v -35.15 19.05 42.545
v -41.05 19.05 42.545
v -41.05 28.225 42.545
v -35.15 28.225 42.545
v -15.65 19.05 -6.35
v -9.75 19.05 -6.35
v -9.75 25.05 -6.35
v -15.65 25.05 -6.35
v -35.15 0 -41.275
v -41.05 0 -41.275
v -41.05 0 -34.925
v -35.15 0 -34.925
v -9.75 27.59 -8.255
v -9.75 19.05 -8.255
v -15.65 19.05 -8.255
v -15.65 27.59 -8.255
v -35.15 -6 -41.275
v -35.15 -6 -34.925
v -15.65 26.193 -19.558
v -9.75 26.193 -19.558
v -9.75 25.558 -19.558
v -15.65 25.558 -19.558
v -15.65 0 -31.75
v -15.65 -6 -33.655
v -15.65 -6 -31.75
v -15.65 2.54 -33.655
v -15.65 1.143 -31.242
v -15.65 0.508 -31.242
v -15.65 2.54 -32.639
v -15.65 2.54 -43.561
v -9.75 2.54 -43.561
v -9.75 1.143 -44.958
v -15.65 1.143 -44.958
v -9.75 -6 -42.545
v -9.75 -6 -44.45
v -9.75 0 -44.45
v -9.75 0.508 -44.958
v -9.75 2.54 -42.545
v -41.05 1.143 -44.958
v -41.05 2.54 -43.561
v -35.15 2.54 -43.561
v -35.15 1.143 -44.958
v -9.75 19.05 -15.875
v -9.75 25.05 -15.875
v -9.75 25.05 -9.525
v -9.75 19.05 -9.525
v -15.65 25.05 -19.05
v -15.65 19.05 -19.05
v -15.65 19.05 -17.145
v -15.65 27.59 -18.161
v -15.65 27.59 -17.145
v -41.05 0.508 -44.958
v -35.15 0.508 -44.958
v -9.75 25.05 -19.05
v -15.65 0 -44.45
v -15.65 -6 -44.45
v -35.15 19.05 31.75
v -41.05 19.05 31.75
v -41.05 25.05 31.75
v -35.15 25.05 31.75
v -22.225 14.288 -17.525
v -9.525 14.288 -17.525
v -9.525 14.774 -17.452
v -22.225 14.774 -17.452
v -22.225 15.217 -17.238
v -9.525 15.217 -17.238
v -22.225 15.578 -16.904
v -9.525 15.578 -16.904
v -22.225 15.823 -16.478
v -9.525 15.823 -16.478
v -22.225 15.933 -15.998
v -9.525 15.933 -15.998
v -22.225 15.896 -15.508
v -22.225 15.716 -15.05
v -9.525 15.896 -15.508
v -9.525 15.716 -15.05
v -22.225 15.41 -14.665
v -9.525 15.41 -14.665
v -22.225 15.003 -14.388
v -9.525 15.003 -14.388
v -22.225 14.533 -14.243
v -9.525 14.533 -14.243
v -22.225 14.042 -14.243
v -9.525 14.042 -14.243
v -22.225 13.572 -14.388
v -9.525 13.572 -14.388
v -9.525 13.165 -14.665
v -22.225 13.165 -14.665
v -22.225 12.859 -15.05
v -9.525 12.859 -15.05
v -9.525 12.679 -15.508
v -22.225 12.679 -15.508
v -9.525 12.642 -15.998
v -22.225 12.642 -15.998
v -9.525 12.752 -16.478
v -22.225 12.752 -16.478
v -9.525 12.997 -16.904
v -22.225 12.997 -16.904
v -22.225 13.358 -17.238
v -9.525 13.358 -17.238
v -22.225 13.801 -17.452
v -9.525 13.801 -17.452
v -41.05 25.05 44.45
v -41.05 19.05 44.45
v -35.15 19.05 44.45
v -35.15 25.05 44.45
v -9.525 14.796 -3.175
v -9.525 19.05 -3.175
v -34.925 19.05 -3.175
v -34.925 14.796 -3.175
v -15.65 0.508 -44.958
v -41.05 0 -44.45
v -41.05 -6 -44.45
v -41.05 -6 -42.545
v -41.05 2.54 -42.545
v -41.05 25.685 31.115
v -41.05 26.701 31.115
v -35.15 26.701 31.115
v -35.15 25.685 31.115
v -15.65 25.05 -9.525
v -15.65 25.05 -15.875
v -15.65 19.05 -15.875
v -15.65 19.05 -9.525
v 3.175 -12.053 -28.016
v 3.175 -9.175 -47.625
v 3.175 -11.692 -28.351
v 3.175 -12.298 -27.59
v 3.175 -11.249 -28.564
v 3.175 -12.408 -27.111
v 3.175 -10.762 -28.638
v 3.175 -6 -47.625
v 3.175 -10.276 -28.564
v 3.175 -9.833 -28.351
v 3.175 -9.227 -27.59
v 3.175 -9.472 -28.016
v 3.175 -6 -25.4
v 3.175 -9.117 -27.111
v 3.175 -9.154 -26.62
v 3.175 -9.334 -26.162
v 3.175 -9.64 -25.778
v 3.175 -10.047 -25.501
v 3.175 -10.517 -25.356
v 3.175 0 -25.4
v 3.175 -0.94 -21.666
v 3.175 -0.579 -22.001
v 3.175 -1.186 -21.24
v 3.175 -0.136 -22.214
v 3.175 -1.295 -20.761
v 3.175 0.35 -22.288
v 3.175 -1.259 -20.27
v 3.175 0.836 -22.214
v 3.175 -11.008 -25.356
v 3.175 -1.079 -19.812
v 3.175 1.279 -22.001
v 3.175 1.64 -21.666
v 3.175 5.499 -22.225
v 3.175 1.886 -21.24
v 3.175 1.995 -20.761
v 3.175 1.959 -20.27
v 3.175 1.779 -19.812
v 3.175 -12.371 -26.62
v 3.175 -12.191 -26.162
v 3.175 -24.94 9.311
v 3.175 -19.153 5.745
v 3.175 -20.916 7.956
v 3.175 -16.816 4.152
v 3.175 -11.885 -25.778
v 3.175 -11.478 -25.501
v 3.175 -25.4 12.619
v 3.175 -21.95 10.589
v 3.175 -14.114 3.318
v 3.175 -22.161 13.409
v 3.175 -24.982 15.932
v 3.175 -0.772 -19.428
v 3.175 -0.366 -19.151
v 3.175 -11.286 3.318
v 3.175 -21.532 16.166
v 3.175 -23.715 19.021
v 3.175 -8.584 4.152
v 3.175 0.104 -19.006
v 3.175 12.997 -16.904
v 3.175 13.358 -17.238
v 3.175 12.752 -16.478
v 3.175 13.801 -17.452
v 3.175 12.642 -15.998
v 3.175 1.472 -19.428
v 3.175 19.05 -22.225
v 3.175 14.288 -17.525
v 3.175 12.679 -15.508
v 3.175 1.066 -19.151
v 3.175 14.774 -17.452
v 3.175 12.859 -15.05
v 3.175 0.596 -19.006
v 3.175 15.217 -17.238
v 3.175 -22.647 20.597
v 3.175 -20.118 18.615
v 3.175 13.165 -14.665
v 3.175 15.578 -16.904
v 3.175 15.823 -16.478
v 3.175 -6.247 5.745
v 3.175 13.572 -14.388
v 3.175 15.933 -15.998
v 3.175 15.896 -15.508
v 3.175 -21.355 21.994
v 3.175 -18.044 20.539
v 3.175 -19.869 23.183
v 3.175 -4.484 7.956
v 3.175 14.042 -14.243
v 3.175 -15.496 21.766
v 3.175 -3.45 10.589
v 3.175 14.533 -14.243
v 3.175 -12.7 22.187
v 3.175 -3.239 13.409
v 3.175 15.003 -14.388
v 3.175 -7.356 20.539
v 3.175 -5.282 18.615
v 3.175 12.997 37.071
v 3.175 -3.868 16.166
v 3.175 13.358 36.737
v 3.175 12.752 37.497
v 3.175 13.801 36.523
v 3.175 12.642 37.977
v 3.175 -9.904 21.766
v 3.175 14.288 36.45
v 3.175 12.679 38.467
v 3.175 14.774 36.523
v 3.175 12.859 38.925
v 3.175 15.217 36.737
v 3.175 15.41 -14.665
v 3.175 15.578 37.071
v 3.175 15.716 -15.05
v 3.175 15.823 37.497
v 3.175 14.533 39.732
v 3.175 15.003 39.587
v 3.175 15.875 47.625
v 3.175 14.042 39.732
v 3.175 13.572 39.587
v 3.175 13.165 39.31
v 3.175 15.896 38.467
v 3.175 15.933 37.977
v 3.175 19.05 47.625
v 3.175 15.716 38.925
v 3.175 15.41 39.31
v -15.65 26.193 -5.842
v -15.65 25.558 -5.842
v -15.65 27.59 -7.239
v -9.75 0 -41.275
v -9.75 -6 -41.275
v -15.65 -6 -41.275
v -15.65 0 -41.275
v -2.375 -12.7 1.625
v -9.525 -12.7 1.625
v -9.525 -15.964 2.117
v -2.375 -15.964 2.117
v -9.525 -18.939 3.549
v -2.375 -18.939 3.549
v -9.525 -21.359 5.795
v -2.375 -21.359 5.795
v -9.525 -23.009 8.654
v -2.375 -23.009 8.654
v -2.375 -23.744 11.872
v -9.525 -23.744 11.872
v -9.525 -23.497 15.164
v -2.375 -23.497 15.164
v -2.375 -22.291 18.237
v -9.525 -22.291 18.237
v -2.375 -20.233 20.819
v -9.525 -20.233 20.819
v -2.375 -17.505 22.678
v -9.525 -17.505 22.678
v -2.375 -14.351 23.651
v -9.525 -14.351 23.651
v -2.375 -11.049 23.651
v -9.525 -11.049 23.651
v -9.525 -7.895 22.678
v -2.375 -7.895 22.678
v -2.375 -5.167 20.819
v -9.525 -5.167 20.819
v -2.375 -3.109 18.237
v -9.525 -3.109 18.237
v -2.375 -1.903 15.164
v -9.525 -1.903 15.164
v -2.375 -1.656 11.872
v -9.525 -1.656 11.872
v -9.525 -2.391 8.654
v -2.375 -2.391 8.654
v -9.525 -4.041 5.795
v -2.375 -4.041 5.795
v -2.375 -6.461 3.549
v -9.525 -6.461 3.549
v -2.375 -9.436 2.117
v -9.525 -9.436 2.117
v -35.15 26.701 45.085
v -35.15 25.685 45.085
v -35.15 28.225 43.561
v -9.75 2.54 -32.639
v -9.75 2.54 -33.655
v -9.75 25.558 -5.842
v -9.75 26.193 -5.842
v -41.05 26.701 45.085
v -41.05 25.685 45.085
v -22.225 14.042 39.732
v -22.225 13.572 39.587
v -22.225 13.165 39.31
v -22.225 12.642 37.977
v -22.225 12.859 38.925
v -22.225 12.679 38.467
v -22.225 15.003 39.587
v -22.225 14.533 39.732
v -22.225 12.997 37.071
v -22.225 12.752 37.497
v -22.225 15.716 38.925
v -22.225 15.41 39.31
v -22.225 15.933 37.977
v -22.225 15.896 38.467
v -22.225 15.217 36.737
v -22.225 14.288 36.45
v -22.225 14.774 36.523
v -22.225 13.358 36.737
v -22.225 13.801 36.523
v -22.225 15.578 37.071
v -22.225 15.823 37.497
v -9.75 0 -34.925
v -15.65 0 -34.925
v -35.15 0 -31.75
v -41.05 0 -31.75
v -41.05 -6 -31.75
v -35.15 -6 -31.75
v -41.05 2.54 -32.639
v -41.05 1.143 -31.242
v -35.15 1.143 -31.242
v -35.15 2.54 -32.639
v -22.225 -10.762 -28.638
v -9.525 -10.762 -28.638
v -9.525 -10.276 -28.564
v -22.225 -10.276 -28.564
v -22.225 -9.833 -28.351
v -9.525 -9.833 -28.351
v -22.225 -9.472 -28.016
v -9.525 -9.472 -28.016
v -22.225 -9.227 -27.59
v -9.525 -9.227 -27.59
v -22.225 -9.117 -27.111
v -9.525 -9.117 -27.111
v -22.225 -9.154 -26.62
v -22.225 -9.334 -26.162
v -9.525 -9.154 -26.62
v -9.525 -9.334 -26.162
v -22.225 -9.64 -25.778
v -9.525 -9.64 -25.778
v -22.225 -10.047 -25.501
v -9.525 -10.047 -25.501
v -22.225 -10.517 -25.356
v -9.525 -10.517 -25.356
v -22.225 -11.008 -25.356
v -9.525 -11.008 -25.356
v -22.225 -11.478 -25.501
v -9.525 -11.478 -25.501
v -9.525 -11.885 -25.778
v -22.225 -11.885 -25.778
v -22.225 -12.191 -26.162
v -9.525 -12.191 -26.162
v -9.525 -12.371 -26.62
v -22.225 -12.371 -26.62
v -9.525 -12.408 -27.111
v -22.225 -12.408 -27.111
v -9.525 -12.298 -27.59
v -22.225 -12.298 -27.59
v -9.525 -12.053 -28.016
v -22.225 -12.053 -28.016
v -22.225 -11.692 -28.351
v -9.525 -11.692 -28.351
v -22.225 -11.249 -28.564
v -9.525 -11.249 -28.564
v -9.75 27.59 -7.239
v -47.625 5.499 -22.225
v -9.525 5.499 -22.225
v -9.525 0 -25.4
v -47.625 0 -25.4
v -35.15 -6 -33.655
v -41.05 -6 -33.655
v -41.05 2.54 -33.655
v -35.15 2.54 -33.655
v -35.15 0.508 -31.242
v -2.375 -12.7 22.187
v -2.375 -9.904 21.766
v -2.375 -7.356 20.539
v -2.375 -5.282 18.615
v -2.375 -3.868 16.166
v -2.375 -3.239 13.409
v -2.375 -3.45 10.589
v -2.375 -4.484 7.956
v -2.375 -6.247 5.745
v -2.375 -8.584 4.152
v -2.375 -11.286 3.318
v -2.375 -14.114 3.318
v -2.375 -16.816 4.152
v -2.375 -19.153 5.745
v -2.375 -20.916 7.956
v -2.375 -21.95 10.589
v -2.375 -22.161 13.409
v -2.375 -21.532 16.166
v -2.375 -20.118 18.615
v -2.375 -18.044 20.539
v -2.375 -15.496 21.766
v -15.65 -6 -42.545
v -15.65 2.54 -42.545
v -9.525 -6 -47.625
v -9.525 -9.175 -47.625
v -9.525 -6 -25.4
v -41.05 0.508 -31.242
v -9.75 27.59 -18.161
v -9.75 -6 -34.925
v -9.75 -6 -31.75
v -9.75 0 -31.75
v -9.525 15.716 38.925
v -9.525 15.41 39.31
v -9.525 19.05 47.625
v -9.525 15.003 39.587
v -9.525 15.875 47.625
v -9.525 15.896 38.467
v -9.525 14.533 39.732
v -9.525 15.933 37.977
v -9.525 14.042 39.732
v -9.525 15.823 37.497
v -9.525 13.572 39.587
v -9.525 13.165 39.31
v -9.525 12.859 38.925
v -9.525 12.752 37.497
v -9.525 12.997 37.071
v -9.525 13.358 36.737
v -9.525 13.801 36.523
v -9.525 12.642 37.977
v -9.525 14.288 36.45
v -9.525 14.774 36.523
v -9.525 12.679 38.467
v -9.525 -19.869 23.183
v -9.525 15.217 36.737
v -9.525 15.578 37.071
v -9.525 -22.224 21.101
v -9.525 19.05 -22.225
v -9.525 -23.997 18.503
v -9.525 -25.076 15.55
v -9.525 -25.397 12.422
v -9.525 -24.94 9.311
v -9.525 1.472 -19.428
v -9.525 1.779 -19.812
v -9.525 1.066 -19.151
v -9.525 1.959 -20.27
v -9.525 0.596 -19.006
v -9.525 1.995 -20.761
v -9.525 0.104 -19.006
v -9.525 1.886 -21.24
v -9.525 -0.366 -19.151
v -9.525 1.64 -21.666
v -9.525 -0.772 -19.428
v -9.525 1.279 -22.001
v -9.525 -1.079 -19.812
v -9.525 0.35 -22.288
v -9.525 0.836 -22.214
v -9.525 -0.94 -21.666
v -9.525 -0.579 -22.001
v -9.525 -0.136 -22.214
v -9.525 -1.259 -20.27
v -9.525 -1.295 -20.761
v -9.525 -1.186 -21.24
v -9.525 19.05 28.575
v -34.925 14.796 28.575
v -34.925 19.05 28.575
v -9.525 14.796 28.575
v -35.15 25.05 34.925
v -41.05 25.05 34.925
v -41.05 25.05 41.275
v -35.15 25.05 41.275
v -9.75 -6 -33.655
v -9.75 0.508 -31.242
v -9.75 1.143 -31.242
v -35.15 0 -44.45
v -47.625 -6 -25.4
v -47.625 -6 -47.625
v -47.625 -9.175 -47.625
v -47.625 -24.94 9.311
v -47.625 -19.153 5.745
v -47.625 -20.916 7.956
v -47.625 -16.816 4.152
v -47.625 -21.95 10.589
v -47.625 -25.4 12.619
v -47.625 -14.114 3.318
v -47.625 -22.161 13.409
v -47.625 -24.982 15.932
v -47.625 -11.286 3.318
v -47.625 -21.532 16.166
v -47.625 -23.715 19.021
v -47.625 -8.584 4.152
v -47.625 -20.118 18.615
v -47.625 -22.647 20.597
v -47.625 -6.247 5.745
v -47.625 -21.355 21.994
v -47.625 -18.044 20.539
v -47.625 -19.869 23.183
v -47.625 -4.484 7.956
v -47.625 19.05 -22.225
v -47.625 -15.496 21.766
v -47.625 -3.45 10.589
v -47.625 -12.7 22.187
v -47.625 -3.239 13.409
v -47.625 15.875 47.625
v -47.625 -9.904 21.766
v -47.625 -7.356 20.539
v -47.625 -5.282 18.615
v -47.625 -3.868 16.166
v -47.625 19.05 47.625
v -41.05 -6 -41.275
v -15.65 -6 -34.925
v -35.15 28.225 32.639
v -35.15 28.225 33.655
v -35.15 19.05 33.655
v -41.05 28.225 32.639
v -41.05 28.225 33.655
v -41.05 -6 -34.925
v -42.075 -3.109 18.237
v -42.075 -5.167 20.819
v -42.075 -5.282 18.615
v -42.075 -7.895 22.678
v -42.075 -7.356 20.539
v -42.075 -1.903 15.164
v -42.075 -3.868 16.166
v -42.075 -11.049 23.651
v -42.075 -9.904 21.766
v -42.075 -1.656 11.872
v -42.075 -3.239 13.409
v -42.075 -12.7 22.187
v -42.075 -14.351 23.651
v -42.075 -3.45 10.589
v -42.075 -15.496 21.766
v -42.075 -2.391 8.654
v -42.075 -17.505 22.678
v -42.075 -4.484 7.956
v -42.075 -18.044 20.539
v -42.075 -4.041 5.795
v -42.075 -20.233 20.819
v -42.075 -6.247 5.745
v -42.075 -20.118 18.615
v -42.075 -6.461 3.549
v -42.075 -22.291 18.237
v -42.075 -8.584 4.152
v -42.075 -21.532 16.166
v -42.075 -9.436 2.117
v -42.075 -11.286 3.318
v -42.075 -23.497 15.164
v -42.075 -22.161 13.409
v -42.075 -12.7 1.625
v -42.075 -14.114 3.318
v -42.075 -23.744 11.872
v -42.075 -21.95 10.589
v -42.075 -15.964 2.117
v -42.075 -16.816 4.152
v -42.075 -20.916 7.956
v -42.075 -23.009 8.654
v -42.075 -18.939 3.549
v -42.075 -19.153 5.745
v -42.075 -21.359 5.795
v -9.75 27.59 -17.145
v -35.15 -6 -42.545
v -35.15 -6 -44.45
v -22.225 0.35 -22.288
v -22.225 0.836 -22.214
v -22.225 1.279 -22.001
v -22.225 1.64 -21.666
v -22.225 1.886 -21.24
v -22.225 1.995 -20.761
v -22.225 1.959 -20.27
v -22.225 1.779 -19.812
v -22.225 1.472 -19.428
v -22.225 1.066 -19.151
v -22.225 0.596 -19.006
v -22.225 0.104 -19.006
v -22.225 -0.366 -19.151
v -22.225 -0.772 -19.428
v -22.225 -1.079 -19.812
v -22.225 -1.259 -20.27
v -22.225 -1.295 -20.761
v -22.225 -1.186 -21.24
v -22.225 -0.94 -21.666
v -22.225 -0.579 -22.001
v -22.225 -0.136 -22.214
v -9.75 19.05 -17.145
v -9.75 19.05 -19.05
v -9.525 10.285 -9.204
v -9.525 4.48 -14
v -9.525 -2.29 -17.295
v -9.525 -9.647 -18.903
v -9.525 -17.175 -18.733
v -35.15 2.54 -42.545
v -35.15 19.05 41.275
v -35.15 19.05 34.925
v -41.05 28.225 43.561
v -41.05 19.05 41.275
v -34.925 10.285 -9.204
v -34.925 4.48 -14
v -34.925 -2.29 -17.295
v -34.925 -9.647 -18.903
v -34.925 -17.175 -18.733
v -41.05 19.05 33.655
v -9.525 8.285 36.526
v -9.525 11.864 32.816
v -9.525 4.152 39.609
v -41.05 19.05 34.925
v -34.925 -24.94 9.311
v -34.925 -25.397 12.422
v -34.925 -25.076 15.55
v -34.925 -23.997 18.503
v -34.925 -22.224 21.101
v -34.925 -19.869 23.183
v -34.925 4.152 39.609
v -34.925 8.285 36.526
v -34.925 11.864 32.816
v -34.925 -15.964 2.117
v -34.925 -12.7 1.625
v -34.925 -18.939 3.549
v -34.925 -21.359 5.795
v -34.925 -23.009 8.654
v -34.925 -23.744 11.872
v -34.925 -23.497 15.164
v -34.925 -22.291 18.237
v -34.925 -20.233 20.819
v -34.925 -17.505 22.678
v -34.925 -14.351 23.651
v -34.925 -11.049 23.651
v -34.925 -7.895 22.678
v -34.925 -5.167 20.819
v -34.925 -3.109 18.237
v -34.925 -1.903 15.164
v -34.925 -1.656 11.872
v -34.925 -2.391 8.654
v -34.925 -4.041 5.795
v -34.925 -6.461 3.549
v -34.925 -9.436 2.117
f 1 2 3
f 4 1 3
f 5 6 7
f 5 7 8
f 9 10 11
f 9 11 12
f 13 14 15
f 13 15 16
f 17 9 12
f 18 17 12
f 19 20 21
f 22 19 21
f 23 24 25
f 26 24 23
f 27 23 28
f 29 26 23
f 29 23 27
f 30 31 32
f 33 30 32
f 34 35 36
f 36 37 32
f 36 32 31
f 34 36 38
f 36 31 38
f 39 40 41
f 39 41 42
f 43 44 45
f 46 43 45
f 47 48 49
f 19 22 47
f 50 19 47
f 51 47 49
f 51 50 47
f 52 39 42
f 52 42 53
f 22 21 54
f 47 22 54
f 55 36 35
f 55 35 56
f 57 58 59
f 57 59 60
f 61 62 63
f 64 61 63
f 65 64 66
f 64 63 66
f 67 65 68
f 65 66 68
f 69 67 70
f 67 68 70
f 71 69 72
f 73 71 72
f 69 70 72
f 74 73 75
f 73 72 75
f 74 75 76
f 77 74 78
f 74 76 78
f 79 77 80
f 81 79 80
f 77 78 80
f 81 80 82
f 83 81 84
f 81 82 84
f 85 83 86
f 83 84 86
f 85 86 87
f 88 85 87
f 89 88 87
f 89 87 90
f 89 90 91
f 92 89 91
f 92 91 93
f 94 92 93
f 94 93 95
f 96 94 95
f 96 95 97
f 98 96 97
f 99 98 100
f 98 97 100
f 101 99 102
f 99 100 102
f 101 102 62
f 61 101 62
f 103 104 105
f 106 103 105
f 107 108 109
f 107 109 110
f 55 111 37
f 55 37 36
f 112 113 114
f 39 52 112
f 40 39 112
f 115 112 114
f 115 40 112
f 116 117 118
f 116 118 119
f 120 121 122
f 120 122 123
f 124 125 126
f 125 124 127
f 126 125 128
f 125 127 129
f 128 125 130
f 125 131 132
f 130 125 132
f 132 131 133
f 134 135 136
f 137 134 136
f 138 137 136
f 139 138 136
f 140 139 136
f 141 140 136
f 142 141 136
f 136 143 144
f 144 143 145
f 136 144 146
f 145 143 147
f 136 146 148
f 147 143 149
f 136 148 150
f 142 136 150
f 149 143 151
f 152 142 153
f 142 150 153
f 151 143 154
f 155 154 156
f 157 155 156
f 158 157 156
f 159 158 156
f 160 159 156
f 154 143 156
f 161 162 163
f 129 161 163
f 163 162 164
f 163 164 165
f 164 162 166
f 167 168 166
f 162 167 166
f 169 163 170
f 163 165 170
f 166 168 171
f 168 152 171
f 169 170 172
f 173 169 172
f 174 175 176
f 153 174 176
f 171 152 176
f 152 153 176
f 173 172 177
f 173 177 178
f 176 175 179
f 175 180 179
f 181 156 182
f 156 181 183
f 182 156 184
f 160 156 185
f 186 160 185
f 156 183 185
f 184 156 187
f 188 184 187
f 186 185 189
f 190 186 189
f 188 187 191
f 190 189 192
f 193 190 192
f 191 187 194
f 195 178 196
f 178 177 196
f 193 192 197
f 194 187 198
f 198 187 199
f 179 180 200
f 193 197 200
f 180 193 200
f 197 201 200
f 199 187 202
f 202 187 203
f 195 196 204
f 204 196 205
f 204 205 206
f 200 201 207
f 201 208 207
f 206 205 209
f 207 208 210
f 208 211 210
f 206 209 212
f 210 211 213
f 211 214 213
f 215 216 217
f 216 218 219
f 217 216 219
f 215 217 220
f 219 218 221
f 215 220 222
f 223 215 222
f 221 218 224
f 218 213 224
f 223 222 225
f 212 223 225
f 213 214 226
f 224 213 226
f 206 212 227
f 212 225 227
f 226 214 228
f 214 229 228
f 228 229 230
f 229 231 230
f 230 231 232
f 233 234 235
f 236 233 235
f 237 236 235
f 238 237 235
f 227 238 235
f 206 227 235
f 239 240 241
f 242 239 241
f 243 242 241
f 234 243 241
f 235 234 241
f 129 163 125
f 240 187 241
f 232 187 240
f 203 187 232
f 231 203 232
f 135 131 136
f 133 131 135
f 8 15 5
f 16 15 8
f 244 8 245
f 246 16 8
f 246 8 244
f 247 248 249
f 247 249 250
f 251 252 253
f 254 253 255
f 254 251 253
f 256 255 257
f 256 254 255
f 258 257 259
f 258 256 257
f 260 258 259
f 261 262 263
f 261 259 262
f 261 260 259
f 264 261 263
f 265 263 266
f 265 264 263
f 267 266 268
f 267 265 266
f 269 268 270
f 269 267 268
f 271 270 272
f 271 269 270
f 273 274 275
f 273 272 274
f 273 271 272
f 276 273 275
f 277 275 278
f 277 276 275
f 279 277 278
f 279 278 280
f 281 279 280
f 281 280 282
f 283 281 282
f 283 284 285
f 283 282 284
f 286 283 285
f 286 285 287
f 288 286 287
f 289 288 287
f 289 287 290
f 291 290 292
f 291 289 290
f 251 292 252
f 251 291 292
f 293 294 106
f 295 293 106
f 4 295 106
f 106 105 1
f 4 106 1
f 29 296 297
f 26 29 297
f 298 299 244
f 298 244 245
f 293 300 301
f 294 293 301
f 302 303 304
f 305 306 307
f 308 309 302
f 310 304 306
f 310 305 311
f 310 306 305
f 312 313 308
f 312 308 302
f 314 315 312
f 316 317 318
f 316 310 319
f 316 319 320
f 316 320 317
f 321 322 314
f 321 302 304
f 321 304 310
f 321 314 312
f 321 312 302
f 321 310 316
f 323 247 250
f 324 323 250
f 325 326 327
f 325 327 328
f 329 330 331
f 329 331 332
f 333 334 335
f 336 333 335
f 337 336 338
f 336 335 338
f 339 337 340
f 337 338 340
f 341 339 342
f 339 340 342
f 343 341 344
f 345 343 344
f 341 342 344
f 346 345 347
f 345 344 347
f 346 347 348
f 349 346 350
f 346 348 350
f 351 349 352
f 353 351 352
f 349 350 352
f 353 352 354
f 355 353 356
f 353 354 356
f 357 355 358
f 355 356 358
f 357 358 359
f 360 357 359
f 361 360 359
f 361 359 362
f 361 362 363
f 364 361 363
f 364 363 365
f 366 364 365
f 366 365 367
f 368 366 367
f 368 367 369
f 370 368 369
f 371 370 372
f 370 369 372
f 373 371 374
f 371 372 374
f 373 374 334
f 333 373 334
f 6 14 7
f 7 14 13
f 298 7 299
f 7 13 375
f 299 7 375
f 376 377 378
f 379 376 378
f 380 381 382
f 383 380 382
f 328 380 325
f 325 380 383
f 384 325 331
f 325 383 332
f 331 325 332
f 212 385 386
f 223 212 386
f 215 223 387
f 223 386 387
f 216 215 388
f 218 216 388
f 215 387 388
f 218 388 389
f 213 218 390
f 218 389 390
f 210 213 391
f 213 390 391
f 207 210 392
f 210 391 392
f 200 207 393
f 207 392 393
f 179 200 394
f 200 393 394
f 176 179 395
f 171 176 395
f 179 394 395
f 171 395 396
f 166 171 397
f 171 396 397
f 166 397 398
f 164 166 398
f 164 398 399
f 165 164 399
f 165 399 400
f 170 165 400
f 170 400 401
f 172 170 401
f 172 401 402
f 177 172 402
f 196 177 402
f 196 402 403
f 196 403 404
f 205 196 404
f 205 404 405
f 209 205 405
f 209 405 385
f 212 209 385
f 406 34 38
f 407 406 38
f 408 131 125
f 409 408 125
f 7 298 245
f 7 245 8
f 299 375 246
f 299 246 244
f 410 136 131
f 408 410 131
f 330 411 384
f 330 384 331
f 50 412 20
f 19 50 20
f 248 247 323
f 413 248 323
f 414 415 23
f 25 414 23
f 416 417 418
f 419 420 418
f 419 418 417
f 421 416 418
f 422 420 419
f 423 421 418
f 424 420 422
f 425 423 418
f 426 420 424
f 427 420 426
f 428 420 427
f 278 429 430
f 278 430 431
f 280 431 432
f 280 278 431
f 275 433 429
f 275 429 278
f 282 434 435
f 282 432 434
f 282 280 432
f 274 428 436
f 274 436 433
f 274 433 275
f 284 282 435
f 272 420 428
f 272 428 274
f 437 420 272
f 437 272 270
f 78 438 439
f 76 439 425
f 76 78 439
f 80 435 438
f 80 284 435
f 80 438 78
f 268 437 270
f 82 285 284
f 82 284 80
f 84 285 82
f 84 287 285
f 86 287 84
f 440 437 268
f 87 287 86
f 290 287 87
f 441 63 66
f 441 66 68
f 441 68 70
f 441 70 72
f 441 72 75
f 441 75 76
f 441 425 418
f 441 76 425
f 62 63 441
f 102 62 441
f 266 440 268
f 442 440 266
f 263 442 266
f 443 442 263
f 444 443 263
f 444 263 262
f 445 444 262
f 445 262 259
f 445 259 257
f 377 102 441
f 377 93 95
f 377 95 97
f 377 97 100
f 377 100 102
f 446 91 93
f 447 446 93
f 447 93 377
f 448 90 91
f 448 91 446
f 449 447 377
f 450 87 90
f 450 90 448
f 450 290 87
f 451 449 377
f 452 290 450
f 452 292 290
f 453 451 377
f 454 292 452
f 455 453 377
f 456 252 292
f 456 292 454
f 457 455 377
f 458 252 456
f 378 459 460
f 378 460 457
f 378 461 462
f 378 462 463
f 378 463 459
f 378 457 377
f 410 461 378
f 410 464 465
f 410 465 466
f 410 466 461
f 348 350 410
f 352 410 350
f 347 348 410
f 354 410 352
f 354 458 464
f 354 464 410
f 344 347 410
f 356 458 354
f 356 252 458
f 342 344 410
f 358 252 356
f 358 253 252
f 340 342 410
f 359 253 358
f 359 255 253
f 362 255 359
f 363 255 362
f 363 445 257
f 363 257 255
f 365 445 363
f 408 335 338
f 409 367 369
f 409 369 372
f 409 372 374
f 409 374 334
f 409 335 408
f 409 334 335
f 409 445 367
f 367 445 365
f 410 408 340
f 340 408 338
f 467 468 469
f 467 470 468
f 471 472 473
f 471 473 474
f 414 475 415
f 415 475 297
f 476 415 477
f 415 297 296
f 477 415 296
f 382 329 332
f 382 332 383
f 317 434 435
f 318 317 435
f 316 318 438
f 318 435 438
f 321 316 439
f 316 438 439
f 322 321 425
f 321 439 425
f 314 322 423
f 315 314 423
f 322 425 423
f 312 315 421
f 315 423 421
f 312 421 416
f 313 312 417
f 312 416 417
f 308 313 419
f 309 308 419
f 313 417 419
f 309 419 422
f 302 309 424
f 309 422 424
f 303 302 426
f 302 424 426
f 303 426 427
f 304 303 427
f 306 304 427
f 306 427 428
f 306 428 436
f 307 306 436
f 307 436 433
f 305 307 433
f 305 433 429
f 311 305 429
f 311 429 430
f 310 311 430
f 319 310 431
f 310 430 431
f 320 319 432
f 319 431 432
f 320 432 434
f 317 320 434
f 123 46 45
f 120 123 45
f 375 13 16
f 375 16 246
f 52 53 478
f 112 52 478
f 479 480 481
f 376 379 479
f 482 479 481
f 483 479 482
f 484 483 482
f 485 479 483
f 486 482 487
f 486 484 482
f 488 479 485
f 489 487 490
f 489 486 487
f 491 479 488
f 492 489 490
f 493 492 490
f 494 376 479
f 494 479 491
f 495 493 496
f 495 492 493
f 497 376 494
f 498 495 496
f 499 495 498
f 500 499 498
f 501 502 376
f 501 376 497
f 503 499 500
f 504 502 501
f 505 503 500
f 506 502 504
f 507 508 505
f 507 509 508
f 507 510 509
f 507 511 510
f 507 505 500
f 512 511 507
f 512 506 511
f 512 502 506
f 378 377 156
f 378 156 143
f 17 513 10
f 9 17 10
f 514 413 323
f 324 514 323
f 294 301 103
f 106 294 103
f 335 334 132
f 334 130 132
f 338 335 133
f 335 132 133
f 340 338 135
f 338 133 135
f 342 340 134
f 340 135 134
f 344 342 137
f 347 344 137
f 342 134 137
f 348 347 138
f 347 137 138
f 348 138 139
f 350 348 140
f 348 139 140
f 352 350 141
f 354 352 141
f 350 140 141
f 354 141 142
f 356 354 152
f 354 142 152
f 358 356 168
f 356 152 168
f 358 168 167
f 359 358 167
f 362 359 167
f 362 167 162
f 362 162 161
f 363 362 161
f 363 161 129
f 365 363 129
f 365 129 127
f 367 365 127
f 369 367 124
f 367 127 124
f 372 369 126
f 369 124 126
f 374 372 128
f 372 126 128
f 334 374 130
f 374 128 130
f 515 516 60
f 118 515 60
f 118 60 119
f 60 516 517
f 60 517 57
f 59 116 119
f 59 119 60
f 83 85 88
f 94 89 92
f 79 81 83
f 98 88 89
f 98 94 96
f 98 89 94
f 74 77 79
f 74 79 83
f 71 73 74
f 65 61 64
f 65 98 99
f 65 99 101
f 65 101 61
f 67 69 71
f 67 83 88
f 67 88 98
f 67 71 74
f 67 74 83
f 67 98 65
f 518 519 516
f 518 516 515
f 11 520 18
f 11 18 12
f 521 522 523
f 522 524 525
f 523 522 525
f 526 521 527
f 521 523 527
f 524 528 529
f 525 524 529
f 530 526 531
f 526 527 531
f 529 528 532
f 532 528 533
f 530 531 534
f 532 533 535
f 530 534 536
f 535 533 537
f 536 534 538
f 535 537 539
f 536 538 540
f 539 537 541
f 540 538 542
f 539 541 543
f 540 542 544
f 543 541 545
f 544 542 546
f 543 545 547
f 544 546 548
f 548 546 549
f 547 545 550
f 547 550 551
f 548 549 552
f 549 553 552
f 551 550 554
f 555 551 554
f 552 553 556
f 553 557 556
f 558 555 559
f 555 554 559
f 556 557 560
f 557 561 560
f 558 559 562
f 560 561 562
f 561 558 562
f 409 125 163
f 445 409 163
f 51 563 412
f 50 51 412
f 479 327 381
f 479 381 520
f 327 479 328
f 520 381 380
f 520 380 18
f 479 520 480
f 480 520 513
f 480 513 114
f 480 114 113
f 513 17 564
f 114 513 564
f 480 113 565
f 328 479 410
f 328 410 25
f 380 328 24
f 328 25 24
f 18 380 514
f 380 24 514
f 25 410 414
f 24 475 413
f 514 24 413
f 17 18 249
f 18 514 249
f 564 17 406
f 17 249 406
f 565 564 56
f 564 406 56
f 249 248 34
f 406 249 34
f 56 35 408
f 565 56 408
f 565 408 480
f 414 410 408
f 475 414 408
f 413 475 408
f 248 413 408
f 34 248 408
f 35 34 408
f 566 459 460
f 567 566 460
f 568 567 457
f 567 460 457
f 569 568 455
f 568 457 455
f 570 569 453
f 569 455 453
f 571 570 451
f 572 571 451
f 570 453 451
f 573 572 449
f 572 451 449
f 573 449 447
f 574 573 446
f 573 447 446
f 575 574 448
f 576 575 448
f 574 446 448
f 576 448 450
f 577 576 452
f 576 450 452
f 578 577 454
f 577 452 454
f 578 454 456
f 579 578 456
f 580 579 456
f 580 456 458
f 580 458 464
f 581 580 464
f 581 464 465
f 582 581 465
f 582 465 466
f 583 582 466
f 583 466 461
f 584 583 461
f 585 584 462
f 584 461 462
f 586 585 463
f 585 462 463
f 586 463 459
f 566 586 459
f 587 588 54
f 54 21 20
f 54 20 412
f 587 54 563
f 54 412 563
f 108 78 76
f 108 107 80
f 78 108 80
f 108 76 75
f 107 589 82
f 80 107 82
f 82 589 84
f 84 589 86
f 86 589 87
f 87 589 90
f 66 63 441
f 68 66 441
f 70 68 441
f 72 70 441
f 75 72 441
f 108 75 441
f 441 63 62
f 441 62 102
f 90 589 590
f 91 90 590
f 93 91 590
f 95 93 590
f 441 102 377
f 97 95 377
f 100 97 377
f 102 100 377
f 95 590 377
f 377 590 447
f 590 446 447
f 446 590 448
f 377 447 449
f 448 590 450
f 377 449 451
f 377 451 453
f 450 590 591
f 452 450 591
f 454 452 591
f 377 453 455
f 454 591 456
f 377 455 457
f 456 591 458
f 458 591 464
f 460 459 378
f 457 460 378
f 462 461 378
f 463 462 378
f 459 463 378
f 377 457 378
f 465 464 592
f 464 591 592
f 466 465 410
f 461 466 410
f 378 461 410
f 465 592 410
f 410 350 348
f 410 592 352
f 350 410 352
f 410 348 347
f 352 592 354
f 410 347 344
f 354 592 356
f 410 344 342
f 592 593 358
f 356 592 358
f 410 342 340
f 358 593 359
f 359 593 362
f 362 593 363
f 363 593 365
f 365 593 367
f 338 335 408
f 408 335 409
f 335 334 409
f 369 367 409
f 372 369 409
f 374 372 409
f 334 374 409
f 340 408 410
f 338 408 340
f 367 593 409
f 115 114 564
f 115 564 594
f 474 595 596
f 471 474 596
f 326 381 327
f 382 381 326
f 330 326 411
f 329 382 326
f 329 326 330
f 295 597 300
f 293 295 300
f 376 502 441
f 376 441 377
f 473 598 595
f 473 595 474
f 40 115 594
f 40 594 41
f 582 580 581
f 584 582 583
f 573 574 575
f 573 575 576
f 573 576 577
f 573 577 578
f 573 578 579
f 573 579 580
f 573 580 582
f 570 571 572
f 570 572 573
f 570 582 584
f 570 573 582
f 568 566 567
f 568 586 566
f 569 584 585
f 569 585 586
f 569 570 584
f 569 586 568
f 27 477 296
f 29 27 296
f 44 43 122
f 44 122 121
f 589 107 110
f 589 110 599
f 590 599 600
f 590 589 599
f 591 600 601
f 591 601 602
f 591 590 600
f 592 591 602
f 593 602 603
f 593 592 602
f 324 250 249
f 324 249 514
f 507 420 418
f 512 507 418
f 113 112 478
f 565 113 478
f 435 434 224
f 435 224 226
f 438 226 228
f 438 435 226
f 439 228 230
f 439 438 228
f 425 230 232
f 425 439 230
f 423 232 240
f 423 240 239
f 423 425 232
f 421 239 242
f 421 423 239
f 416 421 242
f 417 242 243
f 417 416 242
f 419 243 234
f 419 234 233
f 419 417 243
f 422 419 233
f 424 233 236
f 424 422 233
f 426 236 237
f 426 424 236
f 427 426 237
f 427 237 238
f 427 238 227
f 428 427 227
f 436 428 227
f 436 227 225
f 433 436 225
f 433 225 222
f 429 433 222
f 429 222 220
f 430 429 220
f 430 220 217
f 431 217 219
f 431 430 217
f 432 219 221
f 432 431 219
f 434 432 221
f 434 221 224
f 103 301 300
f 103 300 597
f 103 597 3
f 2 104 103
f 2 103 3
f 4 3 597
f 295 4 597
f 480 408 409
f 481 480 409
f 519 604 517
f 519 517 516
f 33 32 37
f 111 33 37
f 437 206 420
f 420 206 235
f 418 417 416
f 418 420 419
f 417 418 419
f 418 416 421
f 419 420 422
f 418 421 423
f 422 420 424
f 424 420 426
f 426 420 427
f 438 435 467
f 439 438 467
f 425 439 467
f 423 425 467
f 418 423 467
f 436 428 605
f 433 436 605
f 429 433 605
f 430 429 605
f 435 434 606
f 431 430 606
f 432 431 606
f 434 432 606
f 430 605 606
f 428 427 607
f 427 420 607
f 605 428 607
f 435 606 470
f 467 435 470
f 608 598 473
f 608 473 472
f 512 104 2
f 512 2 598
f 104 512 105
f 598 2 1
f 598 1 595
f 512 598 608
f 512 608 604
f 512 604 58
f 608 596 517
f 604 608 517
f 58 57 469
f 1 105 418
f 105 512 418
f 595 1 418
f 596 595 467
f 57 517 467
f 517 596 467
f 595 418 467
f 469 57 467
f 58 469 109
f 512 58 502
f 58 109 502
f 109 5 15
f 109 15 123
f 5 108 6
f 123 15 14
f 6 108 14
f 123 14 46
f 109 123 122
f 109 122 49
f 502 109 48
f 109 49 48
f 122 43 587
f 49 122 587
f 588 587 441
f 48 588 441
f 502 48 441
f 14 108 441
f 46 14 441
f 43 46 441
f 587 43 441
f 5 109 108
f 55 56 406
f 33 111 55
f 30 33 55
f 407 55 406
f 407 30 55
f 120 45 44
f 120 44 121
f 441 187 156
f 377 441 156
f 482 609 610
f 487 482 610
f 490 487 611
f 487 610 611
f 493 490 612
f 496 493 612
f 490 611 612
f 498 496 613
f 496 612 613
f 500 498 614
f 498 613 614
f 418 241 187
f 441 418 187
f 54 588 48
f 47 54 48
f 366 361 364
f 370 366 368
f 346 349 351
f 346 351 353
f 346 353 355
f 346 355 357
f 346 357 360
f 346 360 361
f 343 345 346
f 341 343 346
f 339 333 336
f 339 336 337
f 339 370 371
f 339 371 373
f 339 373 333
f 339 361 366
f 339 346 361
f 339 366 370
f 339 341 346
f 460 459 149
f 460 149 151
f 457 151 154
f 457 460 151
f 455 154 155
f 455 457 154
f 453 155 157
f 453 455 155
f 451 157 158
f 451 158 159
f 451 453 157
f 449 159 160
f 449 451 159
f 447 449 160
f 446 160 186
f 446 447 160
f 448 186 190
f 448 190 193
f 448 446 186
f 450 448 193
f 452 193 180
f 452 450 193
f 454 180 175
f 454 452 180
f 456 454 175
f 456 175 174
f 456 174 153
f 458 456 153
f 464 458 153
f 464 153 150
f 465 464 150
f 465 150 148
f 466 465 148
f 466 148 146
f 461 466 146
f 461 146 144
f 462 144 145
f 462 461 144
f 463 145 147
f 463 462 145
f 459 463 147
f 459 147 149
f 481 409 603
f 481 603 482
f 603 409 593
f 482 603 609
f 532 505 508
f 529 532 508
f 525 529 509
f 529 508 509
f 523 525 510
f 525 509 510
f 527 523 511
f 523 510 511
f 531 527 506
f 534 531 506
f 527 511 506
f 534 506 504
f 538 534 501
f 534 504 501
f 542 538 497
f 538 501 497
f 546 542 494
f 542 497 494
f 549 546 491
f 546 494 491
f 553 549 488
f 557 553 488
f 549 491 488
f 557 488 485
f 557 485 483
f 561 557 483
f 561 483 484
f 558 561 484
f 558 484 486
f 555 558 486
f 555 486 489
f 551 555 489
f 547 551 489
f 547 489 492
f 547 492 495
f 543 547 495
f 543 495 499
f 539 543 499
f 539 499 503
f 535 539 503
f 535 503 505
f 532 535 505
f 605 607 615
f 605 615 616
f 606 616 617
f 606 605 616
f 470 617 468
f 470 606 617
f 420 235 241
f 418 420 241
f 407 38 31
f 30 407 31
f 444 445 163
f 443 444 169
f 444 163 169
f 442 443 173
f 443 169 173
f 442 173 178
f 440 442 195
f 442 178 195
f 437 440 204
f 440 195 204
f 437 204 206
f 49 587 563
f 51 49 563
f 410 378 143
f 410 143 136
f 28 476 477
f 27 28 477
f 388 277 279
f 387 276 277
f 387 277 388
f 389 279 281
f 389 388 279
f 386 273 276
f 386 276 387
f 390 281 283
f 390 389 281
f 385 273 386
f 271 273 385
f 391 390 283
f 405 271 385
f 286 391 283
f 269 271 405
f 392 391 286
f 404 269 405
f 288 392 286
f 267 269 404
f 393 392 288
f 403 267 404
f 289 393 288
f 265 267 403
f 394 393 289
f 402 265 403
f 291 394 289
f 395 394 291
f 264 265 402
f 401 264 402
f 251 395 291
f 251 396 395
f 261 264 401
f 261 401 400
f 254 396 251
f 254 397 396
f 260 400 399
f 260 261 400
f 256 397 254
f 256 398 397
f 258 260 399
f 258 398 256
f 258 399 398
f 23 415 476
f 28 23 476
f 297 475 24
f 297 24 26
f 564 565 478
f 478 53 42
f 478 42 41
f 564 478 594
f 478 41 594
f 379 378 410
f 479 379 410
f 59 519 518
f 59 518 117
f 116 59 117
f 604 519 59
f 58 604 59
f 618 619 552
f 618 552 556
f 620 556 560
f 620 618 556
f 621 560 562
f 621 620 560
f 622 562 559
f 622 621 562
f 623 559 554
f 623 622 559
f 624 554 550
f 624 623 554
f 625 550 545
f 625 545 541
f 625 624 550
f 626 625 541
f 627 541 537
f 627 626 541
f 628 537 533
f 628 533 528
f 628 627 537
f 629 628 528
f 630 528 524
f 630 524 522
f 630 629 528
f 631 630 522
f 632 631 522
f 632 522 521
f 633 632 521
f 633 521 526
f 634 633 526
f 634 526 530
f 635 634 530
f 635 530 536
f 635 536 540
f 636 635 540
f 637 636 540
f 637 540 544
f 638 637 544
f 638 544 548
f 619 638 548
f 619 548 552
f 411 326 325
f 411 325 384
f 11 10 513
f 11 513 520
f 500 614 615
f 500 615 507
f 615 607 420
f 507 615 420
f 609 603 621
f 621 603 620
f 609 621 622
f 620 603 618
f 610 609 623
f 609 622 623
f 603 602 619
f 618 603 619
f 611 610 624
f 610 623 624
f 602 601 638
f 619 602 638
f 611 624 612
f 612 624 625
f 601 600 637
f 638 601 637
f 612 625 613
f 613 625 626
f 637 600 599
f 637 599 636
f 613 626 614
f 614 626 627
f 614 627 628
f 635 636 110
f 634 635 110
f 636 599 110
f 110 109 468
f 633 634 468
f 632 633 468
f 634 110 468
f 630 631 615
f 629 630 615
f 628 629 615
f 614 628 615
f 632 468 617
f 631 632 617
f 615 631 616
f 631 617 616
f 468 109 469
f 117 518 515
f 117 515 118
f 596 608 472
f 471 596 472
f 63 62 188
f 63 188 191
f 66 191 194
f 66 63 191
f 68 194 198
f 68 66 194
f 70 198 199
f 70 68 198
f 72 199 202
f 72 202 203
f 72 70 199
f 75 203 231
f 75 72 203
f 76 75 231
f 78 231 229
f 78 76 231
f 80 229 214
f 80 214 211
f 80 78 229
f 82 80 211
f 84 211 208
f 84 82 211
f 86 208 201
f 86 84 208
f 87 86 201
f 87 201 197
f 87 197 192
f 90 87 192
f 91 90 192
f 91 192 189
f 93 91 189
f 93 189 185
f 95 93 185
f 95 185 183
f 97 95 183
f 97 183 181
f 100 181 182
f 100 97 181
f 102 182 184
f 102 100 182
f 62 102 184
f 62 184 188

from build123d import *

# Parameters (mm, degrees)
BOSS_EXTRUDE4_DEPTH     = 25.4
CUT_EXTRUDE4_DEPTH      = 12.7
CUT_EXTRUDE5_DEPTH      = 32.55
CUT_EXTRUDE5_DEPTH_BACK = 7.15
SKETCH12_R              = 11.074999948
SKETCH13_R              = 9.487499948
CUT_EXTRUDE6_DEPTH      = 75.121121315
SKETCH22_W              = 5.899999884
SKETCH22_H              = 12.7
BOSS_EXTRUDE9_DEPTH     = 6
SKETCH23_W              = 5.899999884
SKETCH23_H              = 12.7
BOSS_EXTRUDE10_DEPTH    = 5.999999938
BOSS_EXTRUDE11_DEPTH    = 5.899999884
BOSS_EXTRUDE12_DEPTH    = 5.899999884
SKETCH26_W              = 1.27
SKETCH26_H              = 5.999999938
CUT_EXTRUDE10_DEPTH     = 71.856487821
SKETCH29_W              = 1.27
SKETCH29_H              = 6.35
SKETCH29_H_2            = 5.999999938
CUT_EXTRUDE11_DEPTH     = 71.856487821
SKETCH30_W              = 8.365060076
SKETCH30_H              = 18.797575461
SKETCH30_W_2            = 9.861886537
SKETCH30_H_2            = 15.225368687
CUT_EXTRUDE12_DEPTH     = 81.697482922
SPLIT1_SURFACE_1_BACK   = 121.536
SPLIT1_SURFACE_1_DEPTH  = 243.072
SPLIT1_SURFACE_2_BACK   = 121.536
SPLIT1_SURFACE_2_DEPTH  = 243.072
SKETCH33_R              = 1.650000002
CUT_EXTRUDE13_DEPTH     = 12.7


with BuildPart() as part:
    # Sketch10 → Boss-Extrude4 (new, symmetric)
    with BuildSketch(Plane(origin=(-22.225, 0, 0), x_dir=(0, 0, -1), z_dir=(1, 0, 0))):
        with BuildLine():
            Line((47.625, -5.999999938), (47.625, -9.174999938))
            Line((47.625, -9.174999938), (-9.311118837, -24.939505074))
            ThreePointArc((-9.311118837, -24.939505074), (-14.288949363, -25.300207932), (-19.021389685, -23.71499126))
            ThreePointArc((-19.021389685, -23.71499126), (-21.319677585, -22.026905078), (-23.18338697, -19.868584075))
            Line((-23.18338697, -19.868584075), (-47.625, 15.875))
            Line((-47.625, 15.875), (-47.625, 19.05))
            Line((-47.625, 19.05), (22.225, 19.05))
            Line((22.225, 19.05), (22.225, 5.499261314))
            Line((22.225, 5.499261314), (25.4, 0))
            Line((25.4, 0), (25.4, -5.999999938))
            Line((25.4, -5.999999938), (47.625, -5.999999938))
        make_face()
    extrude(amount=BOSS_EXTRUDE4_DEPTH, both=True)

    # Sketch11 → Cut-Extrude4 (cut, symmetric)
    with BuildSketch(Plane(origin=(-22.225, 0, 0), x_dir=(0, 0, -1), z_dir=(1, 0, 0))):
        with BuildLine():
            Line((3.175, 19.05), (3.175, 14.79630657))
            ThreePointArc((3.175, 14.79630657), (-12.7, -44.45), (-28.575, 14.79630657))
            Line((-28.575, 14.79630657), (-28.575, 19.05))
            Line((-28.575, 19.05), (3.175, 19.05))
        make_face()
    extrude(amount=CUT_EXTRUDE4_DEPTH, both=True, mode=Mode.SUBTRACT)

    # Sketch12 → Cut-Extrude5 (cut, two sides: drawn at the far end of the back side and taken through both)
    with BuildSketch(Plane.ZY.offset(9.525).offset(-CUT_EXTRUDE5_DEPTH_BACK)):
        with Locations(Location((12.7, -12.7, 0), (0, 0, 180))):
            Circle(SKETCH12_R)
    extrude(amount=CUT_EXTRUDE5_DEPTH + CUT_EXTRUDE5_DEPTH_BACK, mode=Mode.SUBTRACT)

    # Sketch13 → Cut-Extrude6 (cut, through all)
    with BuildSketch(Plane.ZY.offset(47.625)):
        with Locations((12.7, -12.7)):
            Circle(SKETCH13_R)
    extrude(amount=-CUT_EXTRUDE6_DEPTH, mode=Mode.SUBTRACT)

    # Sketch22 → Boss-Extrude9 (add)
    with BuildSketch(Plane(origin=(0, -5.999999938, 0), x_dir=(1, 0, 0), z_dir=(0, 1, 0))):
        with Locations((-38.1, 38.1)):
            Rectangle(SKETCH22_W, SKETCH22_H)
    boss_extrude9 = extrude(amount=BOSS_EXTRUDE9_DEPTH)

    # Sketch23 → Boss-Extrude10 (add)
    with BuildSketch(Plane(origin=(0, 19.05, 0), x_dir=(1, 0, 0), z_dir=(0, 1, 0))):
        with Locations((-38.1, -38.1)):
            Rectangle(SKETCH23_W, SKETCH23_H)
        with Locations((-38.1, 12.7)):
            Rectangle(SKETCH23_W, SKETCH23_H)
    boss_extrude10 = extrude(amount=BOSS_EXTRUDE10_DEPTH)

    # Sketch25 → Boss-Extrude11 (add)
    with BuildSketch(Plane.ZY.offset(41.049999942)):
        Polygon((-44.958, 0.508), (-44.45, 0), (-42.545, 0), (-42.545, 2.54), (-43.561, 2.54), (-44.958, 1.143), align=None)
        Polygon((-33.655, 2.54), (-33.655, 0), (-31.75, 0), (-31.242, 0.508), (-31.242, 1.143), (-32.639, 2.54), align=None)
    boss_extrude11 = extrude(amount=-BOSS_EXTRUDE11_DEPTH)

    # Sketch27 → Boss-Extrude12 (add)
    with BuildSketch(Plane.ZY.offset(41.049999942)):
        Polygon((-19.05, 25.049999938), (-17.145, 25.049999938), (-17.145, 27.589999938), (-18.161, 27.589999938), (-19.558, 26.192999938), (-19.558, 25.557999938), align=None)
        Polygon((-6.35, 25.049999938), (-8.255, 25.049999938), (-8.255, 27.589999938), (-7.239, 27.589999938), (-5.842, 26.192999938), (-5.842, 25.557999938), align=None)
        Polygon((31.75, 25.049999938), (33.655, 25.049999938), (33.655, 28.224999938), (32.639, 28.224999938), (31.115, 26.700999938), (31.115, 25.684999938), align=None)
        Polygon((44.45, 25.049999938), (42.545, 25.049999938), (42.545, 28.224999938), (43.561, 28.224999938), (45.085, 26.700999938), (45.085, 25.684999938), align=None)
    boss_extrude12 = extrude(amount=-BOSS_EXTRUDE12_DEPTH)

    # Sketch26 → Cut-Extrude10 (cut, through all)
    with BuildSketch(Plane.ZY.offset(41.049999942)):
        with Locations((-41.91, -2.999999969)):
            Rectangle(SKETCH26_W, SKETCH26_H)
        with Locations((-34.29, -2.999999969)):
            Rectangle(SKETCH26_W, SKETCH26_H)
    cut_extrude10 = extrude(amount=-CUT_EXTRUDE10_DEPTH, mode=Mode.SUBTRACT)

    # Sketch29 → Cut-Extrude11 (cut, through all)
    with BuildSketch(Plane.ZY.offset(41.049999942)):
        with Locations((-16.51, 22.225)):
            Rectangle(SKETCH29_W, SKETCH29_H)
        with Locations((-8.89, 22.225)):
            Rectangle(SKETCH29_W, SKETCH29_H)
        with Locations((34.29, 22.049999969)):
            Rectangle(SKETCH29_W, SKETCH29_H_2)
        with Locations((41.91, 22.049999969)):
            Rectangle(SKETCH29_W, SKETCH29_H_2)
    cut_extrude11 = extrude(amount=-CUT_EXTRUDE11_DEPTH, mode=Mode.SUBTRACT)

    # Mirror1: Boss-Extrude9, Boss-Extrude10, Boss-Extrude11, Boss-Extrude12, Cut-Extrude10, Cut-Extrude11 across plane
    add(boss_extrude9.mirror(Plane(origin=(-25.4, 0, 0), x_dir=(0, 0, 1), z_dir=(1, 0, 0))))
    add(boss_extrude10.mirror(Plane(origin=(-25.4, 0, 0), x_dir=(0, 0, 1), z_dir=(1, 0, 0))))
    add(boss_extrude11.mirror(Plane(origin=(-25.4, 0, 0), x_dir=(0, 0, 1), z_dir=(1, 0, 0))))
    add(boss_extrude12.mirror(Plane(origin=(-25.4, 0, 0), x_dir=(0, 0, 1), z_dir=(1, 0, 0))))
    add(cut_extrude10.mirror(Plane(origin=(-25.4, 0, 0), x_dir=(0, 0, 1), z_dir=(1, 0, 0))), mode=Mode.SUBTRACT)
    add(cut_extrude11.mirror(Plane(origin=(-25.4, 0, 0), x_dir=(0, 0, 1), z_dir=(1, 0, 0))), mode=Mode.SUBTRACT)

    # Sketch30 → Cut-Extrude12 (cut, through all)
    with BuildSketch(Plane(origin=(0, 19.05, 0), x_dir=(1, 0, 0), z_dir=(0, 1, 0))):
        with Locations((-12.803226035, -38.026550337)):
            Rectangle(SKETCH30_W, SKETCH30_H)
        with Locations((-37.969415348, 12.586881501)):
            Rectangle(SKETCH30_W_2, SKETCH30_H_2)
    extrude(amount=CUT_EXTRUDE12_DEPTH, mode=Mode.SUBTRACT)


with BuildPart() as body_2:
    # Split1: the piece behind the surface
    add(part.part)
    # Split1 surface: a surface, the sketch's curves swept straight by 243.072 mm
    with BuildLine(Plane(origin=(0, 19.05, 0), x_dir=(1, 0, 0), z_dir=(0, 1, 0)).offset(-SPLIT1_SURFACE_1_BACK), mode=Mode.PRIVATE) as split1_surface_1_path:
        Line((-9.525, -47.625), (-9.525, 48.920147687))
    split1_surface_1 = Shell.extrude(split1_surface_1_path.wire(), (0 * SPLIT1_SURFACE_1_DEPTH, 1 * SPLIT1_SURFACE_1_DEPTH, 0 * SPLIT1_SURFACE_1_DEPTH))
    split(bisect_by=split1_surface_1, keep=Keep.BOTTOM)


with BuildPart() as part_1:
    add(part.part)

    # Split1: split by a surface, the side it looks to stays
    # Split1 surface: a surface, the sketch's curves swept straight by 243.072 mm
    with BuildLine(Plane(origin=(0, 19.05, 0), x_dir=(1, 0, 0), z_dir=(0, 1, 0)).offset(-SPLIT1_SURFACE_2_BACK), mode=Mode.PRIVATE) as split1_surface_2_path:
        Line((-9.525, -47.625), (-9.525, 48.920147687))
    split1_surface_2 = Shell.extrude(split1_surface_2_path.wire(), (0 * SPLIT1_SURFACE_2_DEPTH, 1 * SPLIT1_SURFACE_2_DEPTH, 0 * SPLIT1_SURFACE_2_DEPTH))
    split(bisect_by=split1_surface_2, keep=Keep.TOP)


with BuildPart() as cut_extrude13_tool:
    # Sketch33 → Cut-Extrude13 (new, symmetric)
    with BuildSketch(Plane(origin=(-9.525, 0, 0), x_dir=(0, 0, -1), z_dir=(1, 0, 0))):
        with Locations((-38.1, 14.2875)):
            Circle(SKETCH33_R)
        with Locations((15.875, 14.2875)):
            Circle(SKETCH33_R)
        with Locations((20.6375, 0.350000062)):
            Circle(SKETCH33_R)
        with Locations((26.9875, -10.762499938)):
            Circle(SKETCH33_R)
    extrude(amount=CUT_EXTRUDE13_DEPTH, both=True)


with BuildPart() as part_2:
    add(part_1.part)

    # Cut-Extrude13: cut by cut_extrude13_tool
    add(cut_extrude13_tool.part, mode=Mode.SUBTRACT)


with BuildPart() as body_2_1:
    add(body_2.part)

    # Cut-Extrude13: cut by cut_extrude13_tool
    add(cut_extrude13_tool.part, mode=Mode.SUBTRACT)


solid = Compound([part_2.part, body_2_1.part])
